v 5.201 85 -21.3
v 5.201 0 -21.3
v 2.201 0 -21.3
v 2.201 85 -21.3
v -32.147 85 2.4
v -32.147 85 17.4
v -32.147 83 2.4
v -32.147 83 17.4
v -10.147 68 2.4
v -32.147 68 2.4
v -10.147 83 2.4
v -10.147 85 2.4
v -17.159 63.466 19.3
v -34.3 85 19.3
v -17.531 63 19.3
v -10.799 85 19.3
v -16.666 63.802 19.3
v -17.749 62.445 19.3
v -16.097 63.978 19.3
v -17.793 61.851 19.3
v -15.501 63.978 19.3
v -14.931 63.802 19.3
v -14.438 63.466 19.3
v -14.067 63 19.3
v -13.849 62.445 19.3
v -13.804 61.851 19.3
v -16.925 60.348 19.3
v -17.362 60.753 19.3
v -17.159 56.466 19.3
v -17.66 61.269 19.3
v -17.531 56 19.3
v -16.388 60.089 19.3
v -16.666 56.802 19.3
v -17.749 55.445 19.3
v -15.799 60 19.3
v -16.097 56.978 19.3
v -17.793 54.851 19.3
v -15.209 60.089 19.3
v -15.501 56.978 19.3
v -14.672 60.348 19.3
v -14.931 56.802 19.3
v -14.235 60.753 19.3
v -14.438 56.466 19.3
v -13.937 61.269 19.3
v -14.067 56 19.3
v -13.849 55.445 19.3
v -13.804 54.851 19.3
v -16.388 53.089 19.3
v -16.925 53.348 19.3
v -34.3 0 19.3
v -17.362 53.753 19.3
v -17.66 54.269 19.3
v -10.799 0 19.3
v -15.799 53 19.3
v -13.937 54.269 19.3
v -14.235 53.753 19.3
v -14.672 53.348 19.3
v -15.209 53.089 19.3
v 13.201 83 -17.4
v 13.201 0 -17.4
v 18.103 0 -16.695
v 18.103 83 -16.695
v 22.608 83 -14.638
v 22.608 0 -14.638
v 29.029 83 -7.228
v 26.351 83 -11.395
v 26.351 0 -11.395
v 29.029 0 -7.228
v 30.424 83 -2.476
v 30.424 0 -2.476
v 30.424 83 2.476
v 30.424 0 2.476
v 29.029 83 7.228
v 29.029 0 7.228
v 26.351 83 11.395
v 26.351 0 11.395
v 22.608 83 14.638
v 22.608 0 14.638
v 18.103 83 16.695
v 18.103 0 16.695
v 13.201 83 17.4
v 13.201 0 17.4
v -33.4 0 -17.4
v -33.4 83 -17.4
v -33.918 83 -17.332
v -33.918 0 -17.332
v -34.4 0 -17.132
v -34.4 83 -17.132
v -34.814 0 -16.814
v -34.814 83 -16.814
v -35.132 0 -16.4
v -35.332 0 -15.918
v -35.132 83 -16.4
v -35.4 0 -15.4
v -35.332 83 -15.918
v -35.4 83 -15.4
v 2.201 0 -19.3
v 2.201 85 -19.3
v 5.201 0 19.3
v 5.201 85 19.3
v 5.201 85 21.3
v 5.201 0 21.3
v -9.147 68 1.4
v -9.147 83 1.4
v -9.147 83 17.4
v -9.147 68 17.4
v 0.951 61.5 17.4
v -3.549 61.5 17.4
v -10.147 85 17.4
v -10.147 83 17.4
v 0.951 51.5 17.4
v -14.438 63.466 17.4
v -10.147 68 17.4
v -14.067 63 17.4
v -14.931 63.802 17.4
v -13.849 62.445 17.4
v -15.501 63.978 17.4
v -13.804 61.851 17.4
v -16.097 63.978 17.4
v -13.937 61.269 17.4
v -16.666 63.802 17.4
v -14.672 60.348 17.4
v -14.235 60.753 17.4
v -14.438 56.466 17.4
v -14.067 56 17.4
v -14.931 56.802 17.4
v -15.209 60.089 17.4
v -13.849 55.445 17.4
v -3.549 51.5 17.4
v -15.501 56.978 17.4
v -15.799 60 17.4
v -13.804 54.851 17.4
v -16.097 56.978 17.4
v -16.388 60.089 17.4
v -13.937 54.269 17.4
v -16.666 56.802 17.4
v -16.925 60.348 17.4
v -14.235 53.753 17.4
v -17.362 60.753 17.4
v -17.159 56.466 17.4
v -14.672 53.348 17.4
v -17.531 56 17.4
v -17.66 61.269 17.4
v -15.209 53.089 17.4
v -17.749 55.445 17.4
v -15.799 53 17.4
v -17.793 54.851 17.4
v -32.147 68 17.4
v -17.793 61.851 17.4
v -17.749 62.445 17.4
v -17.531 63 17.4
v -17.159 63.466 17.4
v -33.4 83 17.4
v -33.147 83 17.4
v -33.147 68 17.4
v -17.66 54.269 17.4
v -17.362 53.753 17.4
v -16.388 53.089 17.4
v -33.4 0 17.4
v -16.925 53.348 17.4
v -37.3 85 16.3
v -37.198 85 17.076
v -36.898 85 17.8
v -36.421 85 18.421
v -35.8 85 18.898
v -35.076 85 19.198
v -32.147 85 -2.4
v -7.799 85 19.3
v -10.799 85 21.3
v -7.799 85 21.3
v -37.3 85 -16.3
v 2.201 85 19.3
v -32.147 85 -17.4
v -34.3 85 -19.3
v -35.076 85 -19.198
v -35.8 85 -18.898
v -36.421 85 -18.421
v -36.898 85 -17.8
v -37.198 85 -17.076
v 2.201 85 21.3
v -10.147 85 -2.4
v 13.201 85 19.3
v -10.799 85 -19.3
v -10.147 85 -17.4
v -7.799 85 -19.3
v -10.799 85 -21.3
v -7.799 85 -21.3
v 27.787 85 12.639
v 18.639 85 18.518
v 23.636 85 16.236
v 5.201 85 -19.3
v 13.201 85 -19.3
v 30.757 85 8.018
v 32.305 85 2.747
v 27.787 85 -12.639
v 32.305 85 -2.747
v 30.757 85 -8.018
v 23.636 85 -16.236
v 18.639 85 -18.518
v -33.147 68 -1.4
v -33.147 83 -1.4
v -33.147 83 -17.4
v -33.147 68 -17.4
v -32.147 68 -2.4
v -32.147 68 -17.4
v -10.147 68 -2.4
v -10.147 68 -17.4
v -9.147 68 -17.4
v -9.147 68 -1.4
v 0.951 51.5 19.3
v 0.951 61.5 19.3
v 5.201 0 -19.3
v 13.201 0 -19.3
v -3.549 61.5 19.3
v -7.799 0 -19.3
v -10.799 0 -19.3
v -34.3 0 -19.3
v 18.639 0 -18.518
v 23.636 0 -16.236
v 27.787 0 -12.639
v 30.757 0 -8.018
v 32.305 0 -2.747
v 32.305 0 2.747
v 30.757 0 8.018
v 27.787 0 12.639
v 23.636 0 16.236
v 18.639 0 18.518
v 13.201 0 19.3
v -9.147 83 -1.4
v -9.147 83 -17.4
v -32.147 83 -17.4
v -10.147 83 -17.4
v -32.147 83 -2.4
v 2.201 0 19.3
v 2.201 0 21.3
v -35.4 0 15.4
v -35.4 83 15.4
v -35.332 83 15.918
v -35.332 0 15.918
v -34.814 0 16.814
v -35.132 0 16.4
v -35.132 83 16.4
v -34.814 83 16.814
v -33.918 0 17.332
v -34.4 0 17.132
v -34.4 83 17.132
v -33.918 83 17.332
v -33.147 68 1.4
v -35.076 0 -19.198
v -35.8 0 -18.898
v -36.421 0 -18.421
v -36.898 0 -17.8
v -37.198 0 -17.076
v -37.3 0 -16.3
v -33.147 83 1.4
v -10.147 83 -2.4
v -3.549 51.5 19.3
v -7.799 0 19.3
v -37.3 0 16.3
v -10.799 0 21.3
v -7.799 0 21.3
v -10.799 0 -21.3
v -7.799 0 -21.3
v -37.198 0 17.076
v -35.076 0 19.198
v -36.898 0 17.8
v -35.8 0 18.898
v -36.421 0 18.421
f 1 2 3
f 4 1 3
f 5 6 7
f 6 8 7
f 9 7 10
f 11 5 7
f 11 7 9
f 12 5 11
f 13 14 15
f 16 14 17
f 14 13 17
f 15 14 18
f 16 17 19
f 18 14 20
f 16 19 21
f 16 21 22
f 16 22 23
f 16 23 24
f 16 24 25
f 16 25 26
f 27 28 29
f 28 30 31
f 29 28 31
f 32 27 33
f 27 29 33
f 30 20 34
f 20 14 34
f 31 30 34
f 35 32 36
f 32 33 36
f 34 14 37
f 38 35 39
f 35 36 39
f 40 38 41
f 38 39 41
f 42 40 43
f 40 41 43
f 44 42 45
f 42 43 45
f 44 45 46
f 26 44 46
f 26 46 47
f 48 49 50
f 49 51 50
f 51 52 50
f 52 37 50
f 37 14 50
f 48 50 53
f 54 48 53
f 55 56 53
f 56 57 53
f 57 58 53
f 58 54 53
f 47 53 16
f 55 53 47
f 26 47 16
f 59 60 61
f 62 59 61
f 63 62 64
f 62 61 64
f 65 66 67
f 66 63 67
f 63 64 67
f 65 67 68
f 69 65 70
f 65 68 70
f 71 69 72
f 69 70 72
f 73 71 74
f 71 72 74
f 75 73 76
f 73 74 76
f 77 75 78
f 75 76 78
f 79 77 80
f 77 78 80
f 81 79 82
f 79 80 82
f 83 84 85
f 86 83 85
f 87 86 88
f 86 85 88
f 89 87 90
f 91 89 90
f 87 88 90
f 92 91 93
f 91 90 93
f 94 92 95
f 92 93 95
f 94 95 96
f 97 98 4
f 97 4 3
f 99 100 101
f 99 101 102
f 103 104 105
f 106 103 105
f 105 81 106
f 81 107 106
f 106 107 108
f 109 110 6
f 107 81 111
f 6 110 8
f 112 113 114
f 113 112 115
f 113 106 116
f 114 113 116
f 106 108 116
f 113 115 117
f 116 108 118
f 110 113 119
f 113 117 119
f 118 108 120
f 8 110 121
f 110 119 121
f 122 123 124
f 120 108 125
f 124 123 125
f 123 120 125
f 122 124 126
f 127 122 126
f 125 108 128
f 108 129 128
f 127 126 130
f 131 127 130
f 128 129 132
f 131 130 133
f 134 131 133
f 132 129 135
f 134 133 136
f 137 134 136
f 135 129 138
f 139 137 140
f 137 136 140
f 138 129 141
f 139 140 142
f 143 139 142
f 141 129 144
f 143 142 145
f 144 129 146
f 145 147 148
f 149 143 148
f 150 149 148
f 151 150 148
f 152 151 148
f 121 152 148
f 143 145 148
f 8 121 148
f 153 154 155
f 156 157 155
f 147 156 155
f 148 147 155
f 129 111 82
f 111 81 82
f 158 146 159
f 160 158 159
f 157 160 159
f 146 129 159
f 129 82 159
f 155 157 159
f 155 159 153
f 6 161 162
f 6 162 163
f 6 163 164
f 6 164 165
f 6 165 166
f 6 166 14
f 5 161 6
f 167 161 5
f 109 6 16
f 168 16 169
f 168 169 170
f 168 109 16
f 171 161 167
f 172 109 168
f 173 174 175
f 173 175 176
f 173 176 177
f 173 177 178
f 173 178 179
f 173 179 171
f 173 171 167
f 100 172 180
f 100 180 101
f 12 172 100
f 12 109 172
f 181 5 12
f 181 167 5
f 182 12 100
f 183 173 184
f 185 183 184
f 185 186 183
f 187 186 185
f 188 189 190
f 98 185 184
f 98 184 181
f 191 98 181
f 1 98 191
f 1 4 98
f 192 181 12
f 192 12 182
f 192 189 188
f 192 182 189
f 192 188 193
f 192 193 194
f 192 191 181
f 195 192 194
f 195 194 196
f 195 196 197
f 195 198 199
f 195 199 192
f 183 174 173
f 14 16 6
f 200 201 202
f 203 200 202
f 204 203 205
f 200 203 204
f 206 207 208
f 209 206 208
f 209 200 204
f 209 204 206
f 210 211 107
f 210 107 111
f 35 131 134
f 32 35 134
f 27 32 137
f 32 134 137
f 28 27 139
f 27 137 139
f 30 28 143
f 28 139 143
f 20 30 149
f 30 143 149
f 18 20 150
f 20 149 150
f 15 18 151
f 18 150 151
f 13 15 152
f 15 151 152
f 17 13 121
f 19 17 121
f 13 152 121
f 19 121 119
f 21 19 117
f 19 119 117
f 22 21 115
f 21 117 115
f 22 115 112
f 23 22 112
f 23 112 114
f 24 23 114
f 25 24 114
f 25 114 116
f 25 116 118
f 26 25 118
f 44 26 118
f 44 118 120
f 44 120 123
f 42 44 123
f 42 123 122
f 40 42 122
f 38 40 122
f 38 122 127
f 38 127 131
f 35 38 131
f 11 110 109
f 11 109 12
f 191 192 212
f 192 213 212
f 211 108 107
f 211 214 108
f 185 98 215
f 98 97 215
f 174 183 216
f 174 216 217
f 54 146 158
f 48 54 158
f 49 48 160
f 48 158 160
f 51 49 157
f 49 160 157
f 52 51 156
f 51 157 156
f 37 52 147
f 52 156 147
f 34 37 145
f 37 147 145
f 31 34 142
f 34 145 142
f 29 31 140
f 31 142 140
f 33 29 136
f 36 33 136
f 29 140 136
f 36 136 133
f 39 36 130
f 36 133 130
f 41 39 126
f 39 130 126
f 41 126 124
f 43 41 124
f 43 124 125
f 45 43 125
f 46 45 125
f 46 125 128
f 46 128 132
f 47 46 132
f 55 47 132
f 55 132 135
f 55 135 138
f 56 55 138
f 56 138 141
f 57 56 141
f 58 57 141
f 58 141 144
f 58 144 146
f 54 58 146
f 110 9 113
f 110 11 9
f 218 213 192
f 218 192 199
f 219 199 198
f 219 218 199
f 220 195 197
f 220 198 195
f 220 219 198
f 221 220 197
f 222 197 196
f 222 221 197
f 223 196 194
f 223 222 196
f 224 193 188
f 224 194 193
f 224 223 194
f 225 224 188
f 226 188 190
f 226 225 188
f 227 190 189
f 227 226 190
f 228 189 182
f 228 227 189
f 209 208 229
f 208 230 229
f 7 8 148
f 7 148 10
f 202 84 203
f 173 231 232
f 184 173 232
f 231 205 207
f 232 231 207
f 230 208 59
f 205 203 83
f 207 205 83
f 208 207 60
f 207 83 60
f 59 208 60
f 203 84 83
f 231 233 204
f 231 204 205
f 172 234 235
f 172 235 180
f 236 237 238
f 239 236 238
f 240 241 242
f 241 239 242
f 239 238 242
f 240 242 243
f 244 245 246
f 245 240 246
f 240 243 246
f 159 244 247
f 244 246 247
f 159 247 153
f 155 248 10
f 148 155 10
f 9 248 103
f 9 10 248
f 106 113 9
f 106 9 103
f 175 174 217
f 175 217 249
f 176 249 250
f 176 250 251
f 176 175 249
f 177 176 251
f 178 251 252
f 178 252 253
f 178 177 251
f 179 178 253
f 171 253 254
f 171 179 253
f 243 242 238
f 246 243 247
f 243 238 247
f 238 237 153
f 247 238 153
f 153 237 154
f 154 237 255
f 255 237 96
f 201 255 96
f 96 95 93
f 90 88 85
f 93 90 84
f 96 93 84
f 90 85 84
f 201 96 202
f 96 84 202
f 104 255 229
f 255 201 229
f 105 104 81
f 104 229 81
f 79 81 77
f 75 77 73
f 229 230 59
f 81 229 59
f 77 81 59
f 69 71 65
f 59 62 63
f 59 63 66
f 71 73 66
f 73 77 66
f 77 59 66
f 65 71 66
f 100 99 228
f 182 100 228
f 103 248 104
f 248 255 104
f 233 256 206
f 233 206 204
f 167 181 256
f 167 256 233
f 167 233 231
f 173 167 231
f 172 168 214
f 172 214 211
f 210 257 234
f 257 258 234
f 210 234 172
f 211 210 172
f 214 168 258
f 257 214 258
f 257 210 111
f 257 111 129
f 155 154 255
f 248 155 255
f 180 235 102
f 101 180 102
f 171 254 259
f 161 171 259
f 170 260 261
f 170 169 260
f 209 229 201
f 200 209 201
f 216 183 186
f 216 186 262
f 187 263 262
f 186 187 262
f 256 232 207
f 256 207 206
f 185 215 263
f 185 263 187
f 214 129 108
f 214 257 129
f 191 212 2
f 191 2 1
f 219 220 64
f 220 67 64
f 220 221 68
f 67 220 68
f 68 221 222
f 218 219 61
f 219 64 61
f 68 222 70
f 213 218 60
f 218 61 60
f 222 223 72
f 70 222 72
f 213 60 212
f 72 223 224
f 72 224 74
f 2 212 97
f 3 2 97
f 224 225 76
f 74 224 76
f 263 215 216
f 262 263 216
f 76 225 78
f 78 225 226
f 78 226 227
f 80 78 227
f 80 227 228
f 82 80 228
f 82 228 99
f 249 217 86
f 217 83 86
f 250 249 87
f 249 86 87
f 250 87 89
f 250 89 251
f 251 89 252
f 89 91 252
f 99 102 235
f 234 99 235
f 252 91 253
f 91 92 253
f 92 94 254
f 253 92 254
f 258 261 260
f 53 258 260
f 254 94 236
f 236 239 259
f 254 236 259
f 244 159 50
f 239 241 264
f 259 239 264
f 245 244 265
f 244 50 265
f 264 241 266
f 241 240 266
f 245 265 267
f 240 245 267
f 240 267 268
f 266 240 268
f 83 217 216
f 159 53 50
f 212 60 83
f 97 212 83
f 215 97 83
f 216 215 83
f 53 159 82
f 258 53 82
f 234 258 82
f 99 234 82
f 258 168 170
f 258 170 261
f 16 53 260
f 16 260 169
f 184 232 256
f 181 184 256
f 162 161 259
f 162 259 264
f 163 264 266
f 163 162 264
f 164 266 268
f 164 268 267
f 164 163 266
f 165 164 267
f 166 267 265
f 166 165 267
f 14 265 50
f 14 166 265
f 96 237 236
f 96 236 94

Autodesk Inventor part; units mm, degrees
ref_plane "YZ Plane" through (0, 0, 0) normal (1, 0, 0) x (0, 1, 0)
ref_plane "XZ Plane" through (0, 0, 0) normal (0, 1, 0) x (-1, 0, 0)
sketch "Sketch1" plane through (0, 0, 0) normal (0, 1, 0) x (-1, 0, 0)
  line L0 (35.4, 17.4) -> (35.4, -17.4)
  line L1 (35.4, -17.4) -> (-13.2013, -17.4)
  arc A0 (-13.2013, 17.4) -> (-13.2013, -17.4) centre (-13.2013, 0) ccw
  line L2 (-13.2013, 17.4) -> (35.4, 17.4)
  line L3 (37.3, -19.3) -> (37.3, 19.3)
  line L4 (37.3, 19.3) -> (-13.2013, 19.3)
  arc A1 (-13.2013, 19.3) -> (-13.2013, -19.3) centre (-13.2013, 0) ccw
  line L5 (-13.2013, -19.3) -> (37.3, -19.3)
  point P0 (0, 0)
  point P1 (-13.2013, 0)
  point P2 (0, 0)
  point P3 (-12.8411, -36.7096)
  point P4 (-12.8411, -7.716)
  point P5 (-24.0253, -72.4098)
extrude "Extrusion1" add sketch "Sketch1" along normal blind 83
ref_plane "Work Plane1" through (0, 85, 0) normal (0, 1, 0) x (1, 0, 0)
sketch "Sketch2" plane through (0, 85, 0) normal (0, 1, 0) x (1, 0, 0)
  line L0 (-37.3, 19.3) -> (-37.3, -19.3)
  line L1 (-37.3, -19.3) -> (13.2013, -19.3)
  arc A0 (13.2013, -19.3) -> (13.2013, 19.3) centre (13.2013, 0) ccw
  line L2 (13.2013, 19.3) -> (-37.3, 19.3)
  point P0 (0, 0)
  point P1 (0, 0)
  point P2 (13.2013, 0)
  point P3 (0, 0)
  point P4 (14.0497, 95.3418)
  point P5 (14.0497, 124.3354)
  point P6 (2.8654, 59.6417)
extrude "Extrusion2" add sketch "Sketch2" against normal up to surface (2 mm away)
fillet "Fillet1" radius 3 3 edges at (-37.3, 41.5, -19.3) (-37.3, 84, -19.3) (-37.3, 42.5, 19.3)
fillet "Fillet2" radius 2 2 edges at (-35.4, 41.5, -17.4) (-35.4, 41.5, 17.4)
sketch "Sketch3" plane through (13.2013, 0, -19.3) normal (0, 0, -1) x (-1, 0, 0)
  line L0 (0, 85) -> (47.5013, 85) projected
  line L1 (0, 0) -> (47.5013, 0) projected
  line L2 (8, 85) -> (11, 85)
  line L3 (11, 85) -> (11, 0)
  line L4 (11, 0) -> (8, 0)
  line L5 (8, 0) -> (8, 85)
  line L6 (0, 0) -> (0, 85) projected
  point P0 (8, 0)
  point P1 (11, 85)
  dimension "d28" = 3
  dimension "d29" = 8
extrude "Extrusion5" add sketch "Sketch3" along normal blind 2 contours L0 L3 L1 L5
sketch "Sketch8" plane through (-34.3, 0, -19.3) normal (0, 0, -1) x (-1, 0, 0)
  line L0 (0, 85) -> (-47.5013, 85) projected
  line L1 (-36.5013, 0) -> (0, 0) projected
  line L2 (-26.5013, 85) -> (-23.5013, 85)
  line L3 (-23.5013, 85) -> (-23.5013, 0)
  line L4 (-23.5013, 0) -> (-26.5013, 0)
  line L5 (-26.5013, 0) -> (-26.5013, 85)
  line L6 (-36.5013, 0) -> (-36.5013, 85) projected
  point P0 (-34.3, 0)
  point P1 (-26.5013, 0)
  dimension "d34" = 10
  dimension "d35" = 3
extrude "Extrusion6" add sketch "Sketch8" along normal blind 2 contours L3 L1 L5 L0
sketch "Sketch9" plane through (13.2013, 0, 19.3) normal (0, 0, 1) x (1, 0, 0)
  line L0 (-47.5013, 85) -> (0, 85) projected
  line L1 (-46.6013, 0) -> (0, 0) projected
  line L2 (-11, 85) -> (-8, 85)
  line L3 (-8, 85) -> (-8, 0)
  line L4 (-8, 0) -> (-11, 0)
  line L5 (-11, 0) -> (-11, 85)
  line L6 (0, 0) -> (0, 85) projected
  point P0 (-13.2013, 0)
  point P1 (-11, 0)
  dimension "d38" = 8
  dimension "d39" = 3
extrude "Extrusion7" add sketch "Sketch9" along normal blind 2 contours L0 L3 L1 L5
sketch "Sketch10" plane through (-34.3, 0, 19.3) normal (0, 0, 1) x (1, 0, 0)
  line L0 (47.5013, 0) -> (0.9, 0) projected
  line L1 (23.5013, 85) -> (0, 85) projected
  line L2 (26.5013, 0) -> (23.5013, 0)
  line L3 (23.5013, 0) -> (23.5013, 85)
  line L4 (23.5013, 85) -> (26.5013, 85)
  line L5 (26.5013, 85) -> (26.5013, 0)
  line L6 (36.5013, 85) -> (36.5013, 0) projected
  point P0 (34.3, 0)
  point P1 (23.5013, 0)
  dimension "d42" = 10
  dimension "d43" = 3
extrude "Extrusion8" add sketch "Sketch10" along normal blind 2
sketch "Sketch14" plane through (13.2013, 83, 0) normal (0, -1, 0) x (1, 0, 0)
  line L0 (-46.6013, -17.4) -> (0, -17.4) projected
  line L1 (-45.348, -17.4) -> (-23.348, -17.4)
  line L2 (-23.348, -17.4) -> (-23.348, -2.4)
  line L3 (-23.348, -2.4) -> (-45.348, -2.4)
  line L4 (-45.348, -2.4) -> (-45.348, -17.4)
  line L5 (-46.348, -17.4) -> (-22.348, -17.4)
  line L6 (-22.348, -17.4) -> (-22.348, -1.4)
  line L7 (-22.348, -1.4) -> (-46.348, -1.4)
  line L8 (-46.348, -1.4) -> (-46.348, -17.4)
  point P0 (-13.2013, 0)
  point P1 (-23.348, -17.4)
  point P2 (-22.348, -17.4)
  dimension "d50" = 22
  dimension "d51" = 15
  dimension "d52" = 1
  dimension "d53" = 1
  dimension "d54" = 1
extrude "Extrusion11" add sketch "Sketch14" along normal blind 15 contours L8 L7 L6 L0 L2 L3 L4
sketch "Sketch16" plane through (-32.1466, 83, -17.4) normal (0, -1, 0) x (1, 0, 0)
  line L0 (0, 0) -> (22, 0)
  line L1 (22, 0) -> (22, 15)
  line L2 (22, 15) -> (0, 15)
  line L3 (0, 15) -> (0, 0)
  line L4 (0, 15) -> (22, 15) projected
  line L5 (22, 15) -> (22, 0) projected
  point P0 (32.1466, 17.4)
  dimension "d57" = 0
  dimension "d58" = 0
extrude "Extrusion12" cut sketch "Sketch16" against normal through all
sketch "Sketch19" plane through (13.2013, 83, 0) normal (0, -1, 0) x (1, 0, 0)
  line L0 (0, 17.4) -> (-46.6013, 17.4) projected
  line L1 (-23.348, 17.4) -> (-45.348, 17.4)
  line L2 (-45.348, 17.4) -> (-45.348, 2.4)
  line L3 (-45.348, 2.4) -> (-23.348, 2.4)
  line L4 (-23.348, 2.4) -> (-23.348, 17.4)
  line L5 (-22.348, 17.4) -> (-46.348, 17.4)
  line L6 (-46.348, 17.4) -> (-46.348, 1.4)
  line L7 (-46.348, 1.4) -> (-22.348, 1.4)
  line L8 (-22.348, 1.4) -> (-22.348, 17.4)
  line L9 (-46.348, -1.4) -> (-46.348, -17.4) projected
  point P0 (-13.2013, 0)
  point P1 (-22.348, 9.4)
  dimension "d68" = 15
  dimension "d69" = 22
  dimension "d70" = 1
  dimension "d71" = 1
  dimension "d72" = 1
  dimension "d73" = 0
extrude "Extrusion15" add sketch "Sketch19" along normal blind 15 contours L8 L7 L6 L0 L2 L3 L4
sketch "Sketch22" plane through (-32.1466, 83, 17.4) normal (0, -1, 0) x (1, 0, 0)
  line L0 (22, -15) -> (0, -15) projected
  line L1 (0, 0) -> (0, -15) projected
  line L2 (22, -15) -> (0, -15)
  line L3 (0, -15) -> (0, 0)
  line L4 (0, 0) -> (22, 0)
  line L5 (22, 0) -> (22, -15)
  point P0 (32.1466, -17.4)
extrude "Extrusion16" cut sketch "Sketch22" against normal through all
sketch "Sketch28" plane through (2.2013, 0, 19.3) normal (0, 0, 1) x (1, 0, 0)
  line L0 (-5.75, 61.5) -> (-1.25, 61.5)
  line L1 (-1.25, 61.5) -> (-1.25, 51.5)
  line L2 (-1.25, 51.5) -> (-5.75, 51.5)
  line L3 (-5.75, 51.5) -> (-5.75, 61.5)
  line L4 (-10, 0) -> (0, 0) projected
  line L5 (11, 0) -> (11, 85) projected
  point P0 (-2.2013, 0)
  point P1 (-3.5, 61.5)
  point P2 (-3.5, 51.5)
  dimension "d106" = 61.5
  dimension "d107" = 10
  dimension "d108" = 4.5
  dimension "d109" = 12.25
extrude "Extrusion22" cut sketch "Sketch28" against normal up to surface (1.9 mm away)
sketch "Sketch31" plane through (-34.3, 0, 19.3) normal (0, 0, 1) x (1, 0, 0)
  line L0 (23.5013, 85) -> (23.5013, 0) projected
  line L1 (0, 85) -> (23.5013, 85) projected
  point P0 (34.3, 0)
  point P1 (18.5013, 62)
  dimension "d124" = 5
  dimension "d125" = 23
hole "Hole1" at (-15.7987, 62, 19.3) direction (0, 0, -1) diameter 4 depth 1.9
pattern_linear "Rectangular Pattern1" count 2 spacing 7 along (0, -1, 0) of "Hole1"
properties part number "víko"
